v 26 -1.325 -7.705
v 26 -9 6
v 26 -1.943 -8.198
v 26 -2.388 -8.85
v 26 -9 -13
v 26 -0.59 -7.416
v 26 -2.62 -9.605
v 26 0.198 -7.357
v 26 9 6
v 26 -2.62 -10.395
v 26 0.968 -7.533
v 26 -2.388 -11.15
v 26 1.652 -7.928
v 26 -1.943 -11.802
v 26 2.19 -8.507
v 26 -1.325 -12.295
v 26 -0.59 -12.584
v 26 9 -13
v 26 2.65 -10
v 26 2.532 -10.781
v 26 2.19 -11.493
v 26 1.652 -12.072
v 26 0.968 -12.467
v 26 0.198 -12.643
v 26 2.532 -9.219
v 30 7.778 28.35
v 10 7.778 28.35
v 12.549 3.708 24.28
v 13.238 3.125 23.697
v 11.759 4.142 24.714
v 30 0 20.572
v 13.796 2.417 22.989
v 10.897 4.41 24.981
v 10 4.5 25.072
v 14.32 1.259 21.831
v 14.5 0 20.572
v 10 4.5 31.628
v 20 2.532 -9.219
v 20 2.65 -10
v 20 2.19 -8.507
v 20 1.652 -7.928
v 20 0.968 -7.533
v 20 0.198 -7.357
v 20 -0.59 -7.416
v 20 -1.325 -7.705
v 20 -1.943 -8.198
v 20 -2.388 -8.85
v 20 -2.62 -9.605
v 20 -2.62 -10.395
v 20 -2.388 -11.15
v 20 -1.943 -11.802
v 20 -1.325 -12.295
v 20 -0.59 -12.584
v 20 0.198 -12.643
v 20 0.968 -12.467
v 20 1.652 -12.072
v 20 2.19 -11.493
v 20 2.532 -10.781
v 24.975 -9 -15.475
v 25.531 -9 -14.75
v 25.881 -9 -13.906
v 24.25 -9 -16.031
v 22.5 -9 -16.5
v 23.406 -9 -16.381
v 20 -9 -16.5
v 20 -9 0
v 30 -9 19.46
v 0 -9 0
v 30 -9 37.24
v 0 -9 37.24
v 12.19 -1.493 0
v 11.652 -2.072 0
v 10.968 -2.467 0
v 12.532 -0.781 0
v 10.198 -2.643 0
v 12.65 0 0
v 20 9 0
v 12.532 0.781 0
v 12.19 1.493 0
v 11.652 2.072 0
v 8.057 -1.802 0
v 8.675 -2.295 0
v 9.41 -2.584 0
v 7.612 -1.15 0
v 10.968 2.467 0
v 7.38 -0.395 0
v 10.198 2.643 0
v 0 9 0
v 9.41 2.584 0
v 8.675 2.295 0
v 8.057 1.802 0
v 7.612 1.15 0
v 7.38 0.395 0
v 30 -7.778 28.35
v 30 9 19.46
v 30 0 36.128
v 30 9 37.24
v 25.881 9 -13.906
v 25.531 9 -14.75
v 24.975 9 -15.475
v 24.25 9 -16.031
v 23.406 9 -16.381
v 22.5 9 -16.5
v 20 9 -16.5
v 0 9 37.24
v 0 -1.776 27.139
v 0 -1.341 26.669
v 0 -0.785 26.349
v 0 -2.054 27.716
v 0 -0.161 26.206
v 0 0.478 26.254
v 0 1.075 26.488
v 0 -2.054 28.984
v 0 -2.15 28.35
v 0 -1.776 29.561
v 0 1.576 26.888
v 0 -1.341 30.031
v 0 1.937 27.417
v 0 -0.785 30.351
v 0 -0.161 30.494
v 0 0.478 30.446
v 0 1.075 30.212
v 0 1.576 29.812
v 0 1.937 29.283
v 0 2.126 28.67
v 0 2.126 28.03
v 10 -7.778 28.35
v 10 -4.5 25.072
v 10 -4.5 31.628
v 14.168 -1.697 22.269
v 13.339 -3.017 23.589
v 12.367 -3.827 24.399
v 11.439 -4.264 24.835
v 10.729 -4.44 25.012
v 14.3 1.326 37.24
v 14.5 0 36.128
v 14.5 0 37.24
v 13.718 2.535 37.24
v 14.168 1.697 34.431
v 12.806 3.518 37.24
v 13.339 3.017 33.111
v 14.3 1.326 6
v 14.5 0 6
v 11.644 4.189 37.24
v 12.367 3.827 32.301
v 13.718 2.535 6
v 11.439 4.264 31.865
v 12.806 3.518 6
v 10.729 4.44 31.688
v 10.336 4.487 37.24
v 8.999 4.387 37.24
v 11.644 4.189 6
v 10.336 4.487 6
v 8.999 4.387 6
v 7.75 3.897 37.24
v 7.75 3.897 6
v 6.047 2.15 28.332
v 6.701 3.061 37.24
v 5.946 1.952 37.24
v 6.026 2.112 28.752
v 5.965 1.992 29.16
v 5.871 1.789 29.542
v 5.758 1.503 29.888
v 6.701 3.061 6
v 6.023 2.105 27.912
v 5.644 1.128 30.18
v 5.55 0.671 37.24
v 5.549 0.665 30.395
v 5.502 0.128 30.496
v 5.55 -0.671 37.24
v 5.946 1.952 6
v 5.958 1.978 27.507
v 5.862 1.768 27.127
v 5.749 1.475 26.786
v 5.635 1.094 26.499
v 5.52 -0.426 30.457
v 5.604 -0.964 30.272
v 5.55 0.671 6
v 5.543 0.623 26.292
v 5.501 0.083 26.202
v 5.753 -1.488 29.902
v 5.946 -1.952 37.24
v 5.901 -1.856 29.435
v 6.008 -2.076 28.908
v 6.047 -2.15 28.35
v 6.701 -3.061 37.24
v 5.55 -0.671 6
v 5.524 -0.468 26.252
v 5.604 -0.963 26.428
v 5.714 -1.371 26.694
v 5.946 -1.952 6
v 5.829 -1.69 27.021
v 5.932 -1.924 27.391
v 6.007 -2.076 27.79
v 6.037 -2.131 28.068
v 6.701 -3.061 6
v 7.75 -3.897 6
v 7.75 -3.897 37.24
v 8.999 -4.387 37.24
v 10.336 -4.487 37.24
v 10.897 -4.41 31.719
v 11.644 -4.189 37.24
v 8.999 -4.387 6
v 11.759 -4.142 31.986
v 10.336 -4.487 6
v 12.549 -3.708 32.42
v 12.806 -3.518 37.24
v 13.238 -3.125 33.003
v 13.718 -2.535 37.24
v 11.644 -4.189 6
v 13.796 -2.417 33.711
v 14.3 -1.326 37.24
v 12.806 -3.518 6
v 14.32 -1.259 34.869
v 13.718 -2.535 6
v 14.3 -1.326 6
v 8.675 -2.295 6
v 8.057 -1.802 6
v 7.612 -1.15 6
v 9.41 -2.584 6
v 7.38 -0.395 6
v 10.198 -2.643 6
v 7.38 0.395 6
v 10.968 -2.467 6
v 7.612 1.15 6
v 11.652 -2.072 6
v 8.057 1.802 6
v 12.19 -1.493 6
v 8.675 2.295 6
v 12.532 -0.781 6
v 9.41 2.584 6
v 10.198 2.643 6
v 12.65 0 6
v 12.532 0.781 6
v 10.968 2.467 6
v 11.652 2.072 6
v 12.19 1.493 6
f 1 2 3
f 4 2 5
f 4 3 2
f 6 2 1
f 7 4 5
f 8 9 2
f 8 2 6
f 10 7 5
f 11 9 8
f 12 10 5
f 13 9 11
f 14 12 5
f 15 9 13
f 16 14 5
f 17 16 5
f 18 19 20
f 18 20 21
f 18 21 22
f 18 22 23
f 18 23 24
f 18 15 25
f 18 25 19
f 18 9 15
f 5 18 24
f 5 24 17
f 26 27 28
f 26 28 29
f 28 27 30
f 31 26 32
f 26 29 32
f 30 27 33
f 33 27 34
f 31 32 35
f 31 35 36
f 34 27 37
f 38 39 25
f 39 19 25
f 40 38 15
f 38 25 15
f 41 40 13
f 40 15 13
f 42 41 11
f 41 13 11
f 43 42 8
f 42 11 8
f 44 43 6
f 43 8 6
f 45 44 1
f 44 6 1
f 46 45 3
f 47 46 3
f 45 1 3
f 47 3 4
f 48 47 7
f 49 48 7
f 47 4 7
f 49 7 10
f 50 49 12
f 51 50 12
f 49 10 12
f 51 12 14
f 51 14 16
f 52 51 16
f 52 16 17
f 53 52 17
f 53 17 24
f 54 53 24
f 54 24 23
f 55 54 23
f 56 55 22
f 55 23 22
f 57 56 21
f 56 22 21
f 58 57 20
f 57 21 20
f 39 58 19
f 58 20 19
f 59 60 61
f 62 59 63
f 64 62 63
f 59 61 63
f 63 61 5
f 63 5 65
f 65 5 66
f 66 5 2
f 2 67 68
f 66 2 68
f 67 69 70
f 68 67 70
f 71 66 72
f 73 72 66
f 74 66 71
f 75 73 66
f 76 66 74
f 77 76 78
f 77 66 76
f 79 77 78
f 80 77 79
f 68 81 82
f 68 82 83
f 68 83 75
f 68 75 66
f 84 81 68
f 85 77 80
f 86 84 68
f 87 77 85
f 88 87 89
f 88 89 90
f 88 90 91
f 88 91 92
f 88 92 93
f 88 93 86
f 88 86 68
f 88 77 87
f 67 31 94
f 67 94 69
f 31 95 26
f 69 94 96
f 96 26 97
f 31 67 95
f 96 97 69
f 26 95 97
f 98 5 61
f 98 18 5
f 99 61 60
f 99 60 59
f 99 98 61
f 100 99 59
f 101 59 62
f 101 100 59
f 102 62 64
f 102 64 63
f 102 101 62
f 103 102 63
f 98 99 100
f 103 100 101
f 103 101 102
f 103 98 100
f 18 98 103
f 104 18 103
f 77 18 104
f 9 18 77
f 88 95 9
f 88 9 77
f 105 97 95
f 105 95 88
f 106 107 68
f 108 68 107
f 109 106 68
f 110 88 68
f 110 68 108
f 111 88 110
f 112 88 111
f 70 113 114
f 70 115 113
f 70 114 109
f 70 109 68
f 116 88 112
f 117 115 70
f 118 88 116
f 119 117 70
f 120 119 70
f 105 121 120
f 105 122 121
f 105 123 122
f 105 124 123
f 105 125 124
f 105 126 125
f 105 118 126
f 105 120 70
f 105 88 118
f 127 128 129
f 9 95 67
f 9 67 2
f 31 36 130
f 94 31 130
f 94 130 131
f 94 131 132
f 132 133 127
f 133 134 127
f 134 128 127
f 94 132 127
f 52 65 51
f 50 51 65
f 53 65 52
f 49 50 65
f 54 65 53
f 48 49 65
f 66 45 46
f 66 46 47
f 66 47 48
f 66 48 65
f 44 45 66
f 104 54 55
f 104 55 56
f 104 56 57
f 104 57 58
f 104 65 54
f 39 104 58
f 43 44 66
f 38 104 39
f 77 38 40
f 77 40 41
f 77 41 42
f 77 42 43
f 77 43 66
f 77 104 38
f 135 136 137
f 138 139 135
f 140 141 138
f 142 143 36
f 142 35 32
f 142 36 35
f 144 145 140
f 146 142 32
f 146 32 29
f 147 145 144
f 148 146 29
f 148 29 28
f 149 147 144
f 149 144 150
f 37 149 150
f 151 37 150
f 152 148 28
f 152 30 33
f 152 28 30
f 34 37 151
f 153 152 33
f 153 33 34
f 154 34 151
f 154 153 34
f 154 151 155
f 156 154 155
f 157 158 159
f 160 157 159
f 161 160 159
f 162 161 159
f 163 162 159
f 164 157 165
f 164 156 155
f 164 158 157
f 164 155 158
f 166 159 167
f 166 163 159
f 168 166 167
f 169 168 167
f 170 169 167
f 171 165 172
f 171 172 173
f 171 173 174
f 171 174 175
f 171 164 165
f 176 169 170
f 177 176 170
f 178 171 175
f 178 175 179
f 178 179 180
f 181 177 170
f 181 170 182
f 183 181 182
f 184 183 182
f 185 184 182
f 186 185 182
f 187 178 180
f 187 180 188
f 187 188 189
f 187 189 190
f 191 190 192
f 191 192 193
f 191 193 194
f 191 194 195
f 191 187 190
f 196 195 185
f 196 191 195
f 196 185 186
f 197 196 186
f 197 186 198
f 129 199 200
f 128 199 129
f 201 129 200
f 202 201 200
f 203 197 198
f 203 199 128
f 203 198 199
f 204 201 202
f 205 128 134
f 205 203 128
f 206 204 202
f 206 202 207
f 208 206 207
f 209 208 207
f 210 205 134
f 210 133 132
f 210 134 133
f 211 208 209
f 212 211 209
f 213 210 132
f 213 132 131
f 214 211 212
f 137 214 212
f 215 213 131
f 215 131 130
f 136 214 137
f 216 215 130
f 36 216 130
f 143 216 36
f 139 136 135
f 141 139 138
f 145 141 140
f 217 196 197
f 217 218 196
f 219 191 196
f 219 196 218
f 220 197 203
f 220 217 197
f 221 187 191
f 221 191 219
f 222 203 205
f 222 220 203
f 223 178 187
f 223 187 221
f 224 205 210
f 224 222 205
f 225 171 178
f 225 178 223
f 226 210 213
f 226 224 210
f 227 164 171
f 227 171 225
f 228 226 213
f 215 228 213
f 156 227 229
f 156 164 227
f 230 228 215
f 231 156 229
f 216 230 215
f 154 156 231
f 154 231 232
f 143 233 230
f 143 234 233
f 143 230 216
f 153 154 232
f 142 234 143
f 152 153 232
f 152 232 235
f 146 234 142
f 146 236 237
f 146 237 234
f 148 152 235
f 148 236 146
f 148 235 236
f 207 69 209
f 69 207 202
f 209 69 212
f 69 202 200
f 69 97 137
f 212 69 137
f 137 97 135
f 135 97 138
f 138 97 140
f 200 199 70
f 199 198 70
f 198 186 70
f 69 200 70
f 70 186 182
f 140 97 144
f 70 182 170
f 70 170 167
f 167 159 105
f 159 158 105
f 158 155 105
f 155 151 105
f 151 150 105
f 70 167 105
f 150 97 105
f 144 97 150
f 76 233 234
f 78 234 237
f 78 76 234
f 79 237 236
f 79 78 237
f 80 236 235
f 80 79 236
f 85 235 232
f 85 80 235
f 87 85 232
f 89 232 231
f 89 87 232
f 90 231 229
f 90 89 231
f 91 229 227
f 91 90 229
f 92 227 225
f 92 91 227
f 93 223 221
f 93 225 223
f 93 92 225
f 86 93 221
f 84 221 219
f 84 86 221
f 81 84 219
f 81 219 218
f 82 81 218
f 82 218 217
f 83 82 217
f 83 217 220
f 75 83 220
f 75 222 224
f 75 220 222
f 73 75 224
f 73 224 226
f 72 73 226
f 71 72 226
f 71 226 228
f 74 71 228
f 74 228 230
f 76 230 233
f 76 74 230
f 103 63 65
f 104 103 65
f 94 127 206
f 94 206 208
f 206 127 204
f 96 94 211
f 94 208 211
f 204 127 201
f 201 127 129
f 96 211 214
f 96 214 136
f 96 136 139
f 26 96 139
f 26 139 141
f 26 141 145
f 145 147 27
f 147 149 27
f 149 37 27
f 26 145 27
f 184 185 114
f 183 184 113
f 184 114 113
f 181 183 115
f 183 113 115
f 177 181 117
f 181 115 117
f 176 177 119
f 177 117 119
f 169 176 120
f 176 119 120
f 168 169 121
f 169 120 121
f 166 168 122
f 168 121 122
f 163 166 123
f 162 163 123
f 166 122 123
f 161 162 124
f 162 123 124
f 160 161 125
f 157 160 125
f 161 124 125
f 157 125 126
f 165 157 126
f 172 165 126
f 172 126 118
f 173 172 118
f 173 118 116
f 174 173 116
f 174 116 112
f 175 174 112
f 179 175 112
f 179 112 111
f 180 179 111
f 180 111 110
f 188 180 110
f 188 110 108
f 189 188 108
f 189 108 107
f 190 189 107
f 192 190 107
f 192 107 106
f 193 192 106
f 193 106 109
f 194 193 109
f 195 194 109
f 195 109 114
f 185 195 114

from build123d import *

# Parameters (mm, degrees)
PAD015_DEPTH         = 9
SKETCH051_R          = 2.65
POCKET023_DEPTH      = 37.240539
POCKET023_DEPTH_BACK = 16.501
SKETCH052_R          = 2.65
POCKET024_DEPTH      = 25.001
POCKET024_DEPTH_BACK = 5.001
SKETCH053_R          = 4.5
POCKET025_DEPTH      = 31.240539
SKETCH055_R          = 2.15
POCKET026_DEPTH      = 30.001
POCKET031_DEPTH      = 20.001


with BuildPart() as part:
    # Sketch047 → Pad015 (new body, symmetric)
    with BuildSketch(Plane(origin=(0, 0, 0), x_dir=(-1, 0, 0), z_dir=(0, 1, 0))):
        with BuildLine():
            Line((-22.5, -16.5), (-20, -16.5))
            Line((-20, -16.5), (-20, 0))
            Line((-20, 0), (0, 0))
            Line((0, 0), (0, 6))
            Line((0, 6), (0, 37.239539))
            Line((-30, 37.239539), (0, 37.239539))
            Line((-30, 19.460461), (-30, 37.239539))
            Line((-30, 19.460461), (-26, 6))
            Line((-26, 6), (-26, -13))
            ThreePointArc((-26, -13), (-24.974874, -15.474874), (-22.5, -16.5))
        make_face()
    extrude(amount=PAD015_DEPTH, both=True)

    # Sketch051 → Pocket023 (cut, two sides)
    with BuildSketch(Plane(origin=(10, 0, 0), x_dir=(1, 0, 0), z_dir=(0, 0, 1))) as pocket023_sk:
        Circle(SKETCH051_R)
    extrude(amount=POCKET023_DEPTH, mode=Mode.SUBTRACT)
    extrude(pocket023_sk.sketch, amount=-POCKET023_DEPTH_BACK, mode=Mode.SUBTRACT)

    # Sketch052 → Pocket024 (cut, two sides)
    with BuildSketch(Plane(origin=(25, 0, -10), x_dir=(0, 1, 0), z_dir=(1, 0, 0))) as pocket024_sk:
        Circle(SKETCH052_R)
    extrude(amount=-POCKET024_DEPTH, mode=Mode.SUBTRACT)
    extrude(pocket024_sk.sketch, amount=POCKET024_DEPTH_BACK, mode=Mode.SUBTRACT)

    # Sketch053 → Pocket025 (cut, through all)
    with BuildSketch(Plane(origin=(10, 0, 6), x_dir=(1, 0, 0), z_dir=(0, 0, 1))):
        Circle(SKETCH053_R)
    extrude(amount=POCKET025_DEPTH, mode=Mode.SUBTRACT)

    # Sketch055 → Pocket026 (cut, through all)
    with BuildSketch(Plane(origin=(0, 0, 0), x_dir=(0, -1, 0), z_dir=(-1, 0, 0))):
        with Locations((0, 28.35)):
            Circle(SKETCH055_R)
    extrude(amount=-POCKET026_DEPTH, mode=Mode.SUBTRACT)

    # Sketch066 → Pocket031 (cut, through all)
    with BuildSketch(Plane(origin=(10, 0, 28.35), x_dir=(0, 1, 0), z_dir=(1, 0, 0))):
        Polygon((-7.778175, 0), (0, 7.778175), (7.778175, 0), (0, -7.778175), align=None)
    extrude(amount=POCKET031_DEPTH, mode=Mode.SUBTRACT)


solid = part.part
